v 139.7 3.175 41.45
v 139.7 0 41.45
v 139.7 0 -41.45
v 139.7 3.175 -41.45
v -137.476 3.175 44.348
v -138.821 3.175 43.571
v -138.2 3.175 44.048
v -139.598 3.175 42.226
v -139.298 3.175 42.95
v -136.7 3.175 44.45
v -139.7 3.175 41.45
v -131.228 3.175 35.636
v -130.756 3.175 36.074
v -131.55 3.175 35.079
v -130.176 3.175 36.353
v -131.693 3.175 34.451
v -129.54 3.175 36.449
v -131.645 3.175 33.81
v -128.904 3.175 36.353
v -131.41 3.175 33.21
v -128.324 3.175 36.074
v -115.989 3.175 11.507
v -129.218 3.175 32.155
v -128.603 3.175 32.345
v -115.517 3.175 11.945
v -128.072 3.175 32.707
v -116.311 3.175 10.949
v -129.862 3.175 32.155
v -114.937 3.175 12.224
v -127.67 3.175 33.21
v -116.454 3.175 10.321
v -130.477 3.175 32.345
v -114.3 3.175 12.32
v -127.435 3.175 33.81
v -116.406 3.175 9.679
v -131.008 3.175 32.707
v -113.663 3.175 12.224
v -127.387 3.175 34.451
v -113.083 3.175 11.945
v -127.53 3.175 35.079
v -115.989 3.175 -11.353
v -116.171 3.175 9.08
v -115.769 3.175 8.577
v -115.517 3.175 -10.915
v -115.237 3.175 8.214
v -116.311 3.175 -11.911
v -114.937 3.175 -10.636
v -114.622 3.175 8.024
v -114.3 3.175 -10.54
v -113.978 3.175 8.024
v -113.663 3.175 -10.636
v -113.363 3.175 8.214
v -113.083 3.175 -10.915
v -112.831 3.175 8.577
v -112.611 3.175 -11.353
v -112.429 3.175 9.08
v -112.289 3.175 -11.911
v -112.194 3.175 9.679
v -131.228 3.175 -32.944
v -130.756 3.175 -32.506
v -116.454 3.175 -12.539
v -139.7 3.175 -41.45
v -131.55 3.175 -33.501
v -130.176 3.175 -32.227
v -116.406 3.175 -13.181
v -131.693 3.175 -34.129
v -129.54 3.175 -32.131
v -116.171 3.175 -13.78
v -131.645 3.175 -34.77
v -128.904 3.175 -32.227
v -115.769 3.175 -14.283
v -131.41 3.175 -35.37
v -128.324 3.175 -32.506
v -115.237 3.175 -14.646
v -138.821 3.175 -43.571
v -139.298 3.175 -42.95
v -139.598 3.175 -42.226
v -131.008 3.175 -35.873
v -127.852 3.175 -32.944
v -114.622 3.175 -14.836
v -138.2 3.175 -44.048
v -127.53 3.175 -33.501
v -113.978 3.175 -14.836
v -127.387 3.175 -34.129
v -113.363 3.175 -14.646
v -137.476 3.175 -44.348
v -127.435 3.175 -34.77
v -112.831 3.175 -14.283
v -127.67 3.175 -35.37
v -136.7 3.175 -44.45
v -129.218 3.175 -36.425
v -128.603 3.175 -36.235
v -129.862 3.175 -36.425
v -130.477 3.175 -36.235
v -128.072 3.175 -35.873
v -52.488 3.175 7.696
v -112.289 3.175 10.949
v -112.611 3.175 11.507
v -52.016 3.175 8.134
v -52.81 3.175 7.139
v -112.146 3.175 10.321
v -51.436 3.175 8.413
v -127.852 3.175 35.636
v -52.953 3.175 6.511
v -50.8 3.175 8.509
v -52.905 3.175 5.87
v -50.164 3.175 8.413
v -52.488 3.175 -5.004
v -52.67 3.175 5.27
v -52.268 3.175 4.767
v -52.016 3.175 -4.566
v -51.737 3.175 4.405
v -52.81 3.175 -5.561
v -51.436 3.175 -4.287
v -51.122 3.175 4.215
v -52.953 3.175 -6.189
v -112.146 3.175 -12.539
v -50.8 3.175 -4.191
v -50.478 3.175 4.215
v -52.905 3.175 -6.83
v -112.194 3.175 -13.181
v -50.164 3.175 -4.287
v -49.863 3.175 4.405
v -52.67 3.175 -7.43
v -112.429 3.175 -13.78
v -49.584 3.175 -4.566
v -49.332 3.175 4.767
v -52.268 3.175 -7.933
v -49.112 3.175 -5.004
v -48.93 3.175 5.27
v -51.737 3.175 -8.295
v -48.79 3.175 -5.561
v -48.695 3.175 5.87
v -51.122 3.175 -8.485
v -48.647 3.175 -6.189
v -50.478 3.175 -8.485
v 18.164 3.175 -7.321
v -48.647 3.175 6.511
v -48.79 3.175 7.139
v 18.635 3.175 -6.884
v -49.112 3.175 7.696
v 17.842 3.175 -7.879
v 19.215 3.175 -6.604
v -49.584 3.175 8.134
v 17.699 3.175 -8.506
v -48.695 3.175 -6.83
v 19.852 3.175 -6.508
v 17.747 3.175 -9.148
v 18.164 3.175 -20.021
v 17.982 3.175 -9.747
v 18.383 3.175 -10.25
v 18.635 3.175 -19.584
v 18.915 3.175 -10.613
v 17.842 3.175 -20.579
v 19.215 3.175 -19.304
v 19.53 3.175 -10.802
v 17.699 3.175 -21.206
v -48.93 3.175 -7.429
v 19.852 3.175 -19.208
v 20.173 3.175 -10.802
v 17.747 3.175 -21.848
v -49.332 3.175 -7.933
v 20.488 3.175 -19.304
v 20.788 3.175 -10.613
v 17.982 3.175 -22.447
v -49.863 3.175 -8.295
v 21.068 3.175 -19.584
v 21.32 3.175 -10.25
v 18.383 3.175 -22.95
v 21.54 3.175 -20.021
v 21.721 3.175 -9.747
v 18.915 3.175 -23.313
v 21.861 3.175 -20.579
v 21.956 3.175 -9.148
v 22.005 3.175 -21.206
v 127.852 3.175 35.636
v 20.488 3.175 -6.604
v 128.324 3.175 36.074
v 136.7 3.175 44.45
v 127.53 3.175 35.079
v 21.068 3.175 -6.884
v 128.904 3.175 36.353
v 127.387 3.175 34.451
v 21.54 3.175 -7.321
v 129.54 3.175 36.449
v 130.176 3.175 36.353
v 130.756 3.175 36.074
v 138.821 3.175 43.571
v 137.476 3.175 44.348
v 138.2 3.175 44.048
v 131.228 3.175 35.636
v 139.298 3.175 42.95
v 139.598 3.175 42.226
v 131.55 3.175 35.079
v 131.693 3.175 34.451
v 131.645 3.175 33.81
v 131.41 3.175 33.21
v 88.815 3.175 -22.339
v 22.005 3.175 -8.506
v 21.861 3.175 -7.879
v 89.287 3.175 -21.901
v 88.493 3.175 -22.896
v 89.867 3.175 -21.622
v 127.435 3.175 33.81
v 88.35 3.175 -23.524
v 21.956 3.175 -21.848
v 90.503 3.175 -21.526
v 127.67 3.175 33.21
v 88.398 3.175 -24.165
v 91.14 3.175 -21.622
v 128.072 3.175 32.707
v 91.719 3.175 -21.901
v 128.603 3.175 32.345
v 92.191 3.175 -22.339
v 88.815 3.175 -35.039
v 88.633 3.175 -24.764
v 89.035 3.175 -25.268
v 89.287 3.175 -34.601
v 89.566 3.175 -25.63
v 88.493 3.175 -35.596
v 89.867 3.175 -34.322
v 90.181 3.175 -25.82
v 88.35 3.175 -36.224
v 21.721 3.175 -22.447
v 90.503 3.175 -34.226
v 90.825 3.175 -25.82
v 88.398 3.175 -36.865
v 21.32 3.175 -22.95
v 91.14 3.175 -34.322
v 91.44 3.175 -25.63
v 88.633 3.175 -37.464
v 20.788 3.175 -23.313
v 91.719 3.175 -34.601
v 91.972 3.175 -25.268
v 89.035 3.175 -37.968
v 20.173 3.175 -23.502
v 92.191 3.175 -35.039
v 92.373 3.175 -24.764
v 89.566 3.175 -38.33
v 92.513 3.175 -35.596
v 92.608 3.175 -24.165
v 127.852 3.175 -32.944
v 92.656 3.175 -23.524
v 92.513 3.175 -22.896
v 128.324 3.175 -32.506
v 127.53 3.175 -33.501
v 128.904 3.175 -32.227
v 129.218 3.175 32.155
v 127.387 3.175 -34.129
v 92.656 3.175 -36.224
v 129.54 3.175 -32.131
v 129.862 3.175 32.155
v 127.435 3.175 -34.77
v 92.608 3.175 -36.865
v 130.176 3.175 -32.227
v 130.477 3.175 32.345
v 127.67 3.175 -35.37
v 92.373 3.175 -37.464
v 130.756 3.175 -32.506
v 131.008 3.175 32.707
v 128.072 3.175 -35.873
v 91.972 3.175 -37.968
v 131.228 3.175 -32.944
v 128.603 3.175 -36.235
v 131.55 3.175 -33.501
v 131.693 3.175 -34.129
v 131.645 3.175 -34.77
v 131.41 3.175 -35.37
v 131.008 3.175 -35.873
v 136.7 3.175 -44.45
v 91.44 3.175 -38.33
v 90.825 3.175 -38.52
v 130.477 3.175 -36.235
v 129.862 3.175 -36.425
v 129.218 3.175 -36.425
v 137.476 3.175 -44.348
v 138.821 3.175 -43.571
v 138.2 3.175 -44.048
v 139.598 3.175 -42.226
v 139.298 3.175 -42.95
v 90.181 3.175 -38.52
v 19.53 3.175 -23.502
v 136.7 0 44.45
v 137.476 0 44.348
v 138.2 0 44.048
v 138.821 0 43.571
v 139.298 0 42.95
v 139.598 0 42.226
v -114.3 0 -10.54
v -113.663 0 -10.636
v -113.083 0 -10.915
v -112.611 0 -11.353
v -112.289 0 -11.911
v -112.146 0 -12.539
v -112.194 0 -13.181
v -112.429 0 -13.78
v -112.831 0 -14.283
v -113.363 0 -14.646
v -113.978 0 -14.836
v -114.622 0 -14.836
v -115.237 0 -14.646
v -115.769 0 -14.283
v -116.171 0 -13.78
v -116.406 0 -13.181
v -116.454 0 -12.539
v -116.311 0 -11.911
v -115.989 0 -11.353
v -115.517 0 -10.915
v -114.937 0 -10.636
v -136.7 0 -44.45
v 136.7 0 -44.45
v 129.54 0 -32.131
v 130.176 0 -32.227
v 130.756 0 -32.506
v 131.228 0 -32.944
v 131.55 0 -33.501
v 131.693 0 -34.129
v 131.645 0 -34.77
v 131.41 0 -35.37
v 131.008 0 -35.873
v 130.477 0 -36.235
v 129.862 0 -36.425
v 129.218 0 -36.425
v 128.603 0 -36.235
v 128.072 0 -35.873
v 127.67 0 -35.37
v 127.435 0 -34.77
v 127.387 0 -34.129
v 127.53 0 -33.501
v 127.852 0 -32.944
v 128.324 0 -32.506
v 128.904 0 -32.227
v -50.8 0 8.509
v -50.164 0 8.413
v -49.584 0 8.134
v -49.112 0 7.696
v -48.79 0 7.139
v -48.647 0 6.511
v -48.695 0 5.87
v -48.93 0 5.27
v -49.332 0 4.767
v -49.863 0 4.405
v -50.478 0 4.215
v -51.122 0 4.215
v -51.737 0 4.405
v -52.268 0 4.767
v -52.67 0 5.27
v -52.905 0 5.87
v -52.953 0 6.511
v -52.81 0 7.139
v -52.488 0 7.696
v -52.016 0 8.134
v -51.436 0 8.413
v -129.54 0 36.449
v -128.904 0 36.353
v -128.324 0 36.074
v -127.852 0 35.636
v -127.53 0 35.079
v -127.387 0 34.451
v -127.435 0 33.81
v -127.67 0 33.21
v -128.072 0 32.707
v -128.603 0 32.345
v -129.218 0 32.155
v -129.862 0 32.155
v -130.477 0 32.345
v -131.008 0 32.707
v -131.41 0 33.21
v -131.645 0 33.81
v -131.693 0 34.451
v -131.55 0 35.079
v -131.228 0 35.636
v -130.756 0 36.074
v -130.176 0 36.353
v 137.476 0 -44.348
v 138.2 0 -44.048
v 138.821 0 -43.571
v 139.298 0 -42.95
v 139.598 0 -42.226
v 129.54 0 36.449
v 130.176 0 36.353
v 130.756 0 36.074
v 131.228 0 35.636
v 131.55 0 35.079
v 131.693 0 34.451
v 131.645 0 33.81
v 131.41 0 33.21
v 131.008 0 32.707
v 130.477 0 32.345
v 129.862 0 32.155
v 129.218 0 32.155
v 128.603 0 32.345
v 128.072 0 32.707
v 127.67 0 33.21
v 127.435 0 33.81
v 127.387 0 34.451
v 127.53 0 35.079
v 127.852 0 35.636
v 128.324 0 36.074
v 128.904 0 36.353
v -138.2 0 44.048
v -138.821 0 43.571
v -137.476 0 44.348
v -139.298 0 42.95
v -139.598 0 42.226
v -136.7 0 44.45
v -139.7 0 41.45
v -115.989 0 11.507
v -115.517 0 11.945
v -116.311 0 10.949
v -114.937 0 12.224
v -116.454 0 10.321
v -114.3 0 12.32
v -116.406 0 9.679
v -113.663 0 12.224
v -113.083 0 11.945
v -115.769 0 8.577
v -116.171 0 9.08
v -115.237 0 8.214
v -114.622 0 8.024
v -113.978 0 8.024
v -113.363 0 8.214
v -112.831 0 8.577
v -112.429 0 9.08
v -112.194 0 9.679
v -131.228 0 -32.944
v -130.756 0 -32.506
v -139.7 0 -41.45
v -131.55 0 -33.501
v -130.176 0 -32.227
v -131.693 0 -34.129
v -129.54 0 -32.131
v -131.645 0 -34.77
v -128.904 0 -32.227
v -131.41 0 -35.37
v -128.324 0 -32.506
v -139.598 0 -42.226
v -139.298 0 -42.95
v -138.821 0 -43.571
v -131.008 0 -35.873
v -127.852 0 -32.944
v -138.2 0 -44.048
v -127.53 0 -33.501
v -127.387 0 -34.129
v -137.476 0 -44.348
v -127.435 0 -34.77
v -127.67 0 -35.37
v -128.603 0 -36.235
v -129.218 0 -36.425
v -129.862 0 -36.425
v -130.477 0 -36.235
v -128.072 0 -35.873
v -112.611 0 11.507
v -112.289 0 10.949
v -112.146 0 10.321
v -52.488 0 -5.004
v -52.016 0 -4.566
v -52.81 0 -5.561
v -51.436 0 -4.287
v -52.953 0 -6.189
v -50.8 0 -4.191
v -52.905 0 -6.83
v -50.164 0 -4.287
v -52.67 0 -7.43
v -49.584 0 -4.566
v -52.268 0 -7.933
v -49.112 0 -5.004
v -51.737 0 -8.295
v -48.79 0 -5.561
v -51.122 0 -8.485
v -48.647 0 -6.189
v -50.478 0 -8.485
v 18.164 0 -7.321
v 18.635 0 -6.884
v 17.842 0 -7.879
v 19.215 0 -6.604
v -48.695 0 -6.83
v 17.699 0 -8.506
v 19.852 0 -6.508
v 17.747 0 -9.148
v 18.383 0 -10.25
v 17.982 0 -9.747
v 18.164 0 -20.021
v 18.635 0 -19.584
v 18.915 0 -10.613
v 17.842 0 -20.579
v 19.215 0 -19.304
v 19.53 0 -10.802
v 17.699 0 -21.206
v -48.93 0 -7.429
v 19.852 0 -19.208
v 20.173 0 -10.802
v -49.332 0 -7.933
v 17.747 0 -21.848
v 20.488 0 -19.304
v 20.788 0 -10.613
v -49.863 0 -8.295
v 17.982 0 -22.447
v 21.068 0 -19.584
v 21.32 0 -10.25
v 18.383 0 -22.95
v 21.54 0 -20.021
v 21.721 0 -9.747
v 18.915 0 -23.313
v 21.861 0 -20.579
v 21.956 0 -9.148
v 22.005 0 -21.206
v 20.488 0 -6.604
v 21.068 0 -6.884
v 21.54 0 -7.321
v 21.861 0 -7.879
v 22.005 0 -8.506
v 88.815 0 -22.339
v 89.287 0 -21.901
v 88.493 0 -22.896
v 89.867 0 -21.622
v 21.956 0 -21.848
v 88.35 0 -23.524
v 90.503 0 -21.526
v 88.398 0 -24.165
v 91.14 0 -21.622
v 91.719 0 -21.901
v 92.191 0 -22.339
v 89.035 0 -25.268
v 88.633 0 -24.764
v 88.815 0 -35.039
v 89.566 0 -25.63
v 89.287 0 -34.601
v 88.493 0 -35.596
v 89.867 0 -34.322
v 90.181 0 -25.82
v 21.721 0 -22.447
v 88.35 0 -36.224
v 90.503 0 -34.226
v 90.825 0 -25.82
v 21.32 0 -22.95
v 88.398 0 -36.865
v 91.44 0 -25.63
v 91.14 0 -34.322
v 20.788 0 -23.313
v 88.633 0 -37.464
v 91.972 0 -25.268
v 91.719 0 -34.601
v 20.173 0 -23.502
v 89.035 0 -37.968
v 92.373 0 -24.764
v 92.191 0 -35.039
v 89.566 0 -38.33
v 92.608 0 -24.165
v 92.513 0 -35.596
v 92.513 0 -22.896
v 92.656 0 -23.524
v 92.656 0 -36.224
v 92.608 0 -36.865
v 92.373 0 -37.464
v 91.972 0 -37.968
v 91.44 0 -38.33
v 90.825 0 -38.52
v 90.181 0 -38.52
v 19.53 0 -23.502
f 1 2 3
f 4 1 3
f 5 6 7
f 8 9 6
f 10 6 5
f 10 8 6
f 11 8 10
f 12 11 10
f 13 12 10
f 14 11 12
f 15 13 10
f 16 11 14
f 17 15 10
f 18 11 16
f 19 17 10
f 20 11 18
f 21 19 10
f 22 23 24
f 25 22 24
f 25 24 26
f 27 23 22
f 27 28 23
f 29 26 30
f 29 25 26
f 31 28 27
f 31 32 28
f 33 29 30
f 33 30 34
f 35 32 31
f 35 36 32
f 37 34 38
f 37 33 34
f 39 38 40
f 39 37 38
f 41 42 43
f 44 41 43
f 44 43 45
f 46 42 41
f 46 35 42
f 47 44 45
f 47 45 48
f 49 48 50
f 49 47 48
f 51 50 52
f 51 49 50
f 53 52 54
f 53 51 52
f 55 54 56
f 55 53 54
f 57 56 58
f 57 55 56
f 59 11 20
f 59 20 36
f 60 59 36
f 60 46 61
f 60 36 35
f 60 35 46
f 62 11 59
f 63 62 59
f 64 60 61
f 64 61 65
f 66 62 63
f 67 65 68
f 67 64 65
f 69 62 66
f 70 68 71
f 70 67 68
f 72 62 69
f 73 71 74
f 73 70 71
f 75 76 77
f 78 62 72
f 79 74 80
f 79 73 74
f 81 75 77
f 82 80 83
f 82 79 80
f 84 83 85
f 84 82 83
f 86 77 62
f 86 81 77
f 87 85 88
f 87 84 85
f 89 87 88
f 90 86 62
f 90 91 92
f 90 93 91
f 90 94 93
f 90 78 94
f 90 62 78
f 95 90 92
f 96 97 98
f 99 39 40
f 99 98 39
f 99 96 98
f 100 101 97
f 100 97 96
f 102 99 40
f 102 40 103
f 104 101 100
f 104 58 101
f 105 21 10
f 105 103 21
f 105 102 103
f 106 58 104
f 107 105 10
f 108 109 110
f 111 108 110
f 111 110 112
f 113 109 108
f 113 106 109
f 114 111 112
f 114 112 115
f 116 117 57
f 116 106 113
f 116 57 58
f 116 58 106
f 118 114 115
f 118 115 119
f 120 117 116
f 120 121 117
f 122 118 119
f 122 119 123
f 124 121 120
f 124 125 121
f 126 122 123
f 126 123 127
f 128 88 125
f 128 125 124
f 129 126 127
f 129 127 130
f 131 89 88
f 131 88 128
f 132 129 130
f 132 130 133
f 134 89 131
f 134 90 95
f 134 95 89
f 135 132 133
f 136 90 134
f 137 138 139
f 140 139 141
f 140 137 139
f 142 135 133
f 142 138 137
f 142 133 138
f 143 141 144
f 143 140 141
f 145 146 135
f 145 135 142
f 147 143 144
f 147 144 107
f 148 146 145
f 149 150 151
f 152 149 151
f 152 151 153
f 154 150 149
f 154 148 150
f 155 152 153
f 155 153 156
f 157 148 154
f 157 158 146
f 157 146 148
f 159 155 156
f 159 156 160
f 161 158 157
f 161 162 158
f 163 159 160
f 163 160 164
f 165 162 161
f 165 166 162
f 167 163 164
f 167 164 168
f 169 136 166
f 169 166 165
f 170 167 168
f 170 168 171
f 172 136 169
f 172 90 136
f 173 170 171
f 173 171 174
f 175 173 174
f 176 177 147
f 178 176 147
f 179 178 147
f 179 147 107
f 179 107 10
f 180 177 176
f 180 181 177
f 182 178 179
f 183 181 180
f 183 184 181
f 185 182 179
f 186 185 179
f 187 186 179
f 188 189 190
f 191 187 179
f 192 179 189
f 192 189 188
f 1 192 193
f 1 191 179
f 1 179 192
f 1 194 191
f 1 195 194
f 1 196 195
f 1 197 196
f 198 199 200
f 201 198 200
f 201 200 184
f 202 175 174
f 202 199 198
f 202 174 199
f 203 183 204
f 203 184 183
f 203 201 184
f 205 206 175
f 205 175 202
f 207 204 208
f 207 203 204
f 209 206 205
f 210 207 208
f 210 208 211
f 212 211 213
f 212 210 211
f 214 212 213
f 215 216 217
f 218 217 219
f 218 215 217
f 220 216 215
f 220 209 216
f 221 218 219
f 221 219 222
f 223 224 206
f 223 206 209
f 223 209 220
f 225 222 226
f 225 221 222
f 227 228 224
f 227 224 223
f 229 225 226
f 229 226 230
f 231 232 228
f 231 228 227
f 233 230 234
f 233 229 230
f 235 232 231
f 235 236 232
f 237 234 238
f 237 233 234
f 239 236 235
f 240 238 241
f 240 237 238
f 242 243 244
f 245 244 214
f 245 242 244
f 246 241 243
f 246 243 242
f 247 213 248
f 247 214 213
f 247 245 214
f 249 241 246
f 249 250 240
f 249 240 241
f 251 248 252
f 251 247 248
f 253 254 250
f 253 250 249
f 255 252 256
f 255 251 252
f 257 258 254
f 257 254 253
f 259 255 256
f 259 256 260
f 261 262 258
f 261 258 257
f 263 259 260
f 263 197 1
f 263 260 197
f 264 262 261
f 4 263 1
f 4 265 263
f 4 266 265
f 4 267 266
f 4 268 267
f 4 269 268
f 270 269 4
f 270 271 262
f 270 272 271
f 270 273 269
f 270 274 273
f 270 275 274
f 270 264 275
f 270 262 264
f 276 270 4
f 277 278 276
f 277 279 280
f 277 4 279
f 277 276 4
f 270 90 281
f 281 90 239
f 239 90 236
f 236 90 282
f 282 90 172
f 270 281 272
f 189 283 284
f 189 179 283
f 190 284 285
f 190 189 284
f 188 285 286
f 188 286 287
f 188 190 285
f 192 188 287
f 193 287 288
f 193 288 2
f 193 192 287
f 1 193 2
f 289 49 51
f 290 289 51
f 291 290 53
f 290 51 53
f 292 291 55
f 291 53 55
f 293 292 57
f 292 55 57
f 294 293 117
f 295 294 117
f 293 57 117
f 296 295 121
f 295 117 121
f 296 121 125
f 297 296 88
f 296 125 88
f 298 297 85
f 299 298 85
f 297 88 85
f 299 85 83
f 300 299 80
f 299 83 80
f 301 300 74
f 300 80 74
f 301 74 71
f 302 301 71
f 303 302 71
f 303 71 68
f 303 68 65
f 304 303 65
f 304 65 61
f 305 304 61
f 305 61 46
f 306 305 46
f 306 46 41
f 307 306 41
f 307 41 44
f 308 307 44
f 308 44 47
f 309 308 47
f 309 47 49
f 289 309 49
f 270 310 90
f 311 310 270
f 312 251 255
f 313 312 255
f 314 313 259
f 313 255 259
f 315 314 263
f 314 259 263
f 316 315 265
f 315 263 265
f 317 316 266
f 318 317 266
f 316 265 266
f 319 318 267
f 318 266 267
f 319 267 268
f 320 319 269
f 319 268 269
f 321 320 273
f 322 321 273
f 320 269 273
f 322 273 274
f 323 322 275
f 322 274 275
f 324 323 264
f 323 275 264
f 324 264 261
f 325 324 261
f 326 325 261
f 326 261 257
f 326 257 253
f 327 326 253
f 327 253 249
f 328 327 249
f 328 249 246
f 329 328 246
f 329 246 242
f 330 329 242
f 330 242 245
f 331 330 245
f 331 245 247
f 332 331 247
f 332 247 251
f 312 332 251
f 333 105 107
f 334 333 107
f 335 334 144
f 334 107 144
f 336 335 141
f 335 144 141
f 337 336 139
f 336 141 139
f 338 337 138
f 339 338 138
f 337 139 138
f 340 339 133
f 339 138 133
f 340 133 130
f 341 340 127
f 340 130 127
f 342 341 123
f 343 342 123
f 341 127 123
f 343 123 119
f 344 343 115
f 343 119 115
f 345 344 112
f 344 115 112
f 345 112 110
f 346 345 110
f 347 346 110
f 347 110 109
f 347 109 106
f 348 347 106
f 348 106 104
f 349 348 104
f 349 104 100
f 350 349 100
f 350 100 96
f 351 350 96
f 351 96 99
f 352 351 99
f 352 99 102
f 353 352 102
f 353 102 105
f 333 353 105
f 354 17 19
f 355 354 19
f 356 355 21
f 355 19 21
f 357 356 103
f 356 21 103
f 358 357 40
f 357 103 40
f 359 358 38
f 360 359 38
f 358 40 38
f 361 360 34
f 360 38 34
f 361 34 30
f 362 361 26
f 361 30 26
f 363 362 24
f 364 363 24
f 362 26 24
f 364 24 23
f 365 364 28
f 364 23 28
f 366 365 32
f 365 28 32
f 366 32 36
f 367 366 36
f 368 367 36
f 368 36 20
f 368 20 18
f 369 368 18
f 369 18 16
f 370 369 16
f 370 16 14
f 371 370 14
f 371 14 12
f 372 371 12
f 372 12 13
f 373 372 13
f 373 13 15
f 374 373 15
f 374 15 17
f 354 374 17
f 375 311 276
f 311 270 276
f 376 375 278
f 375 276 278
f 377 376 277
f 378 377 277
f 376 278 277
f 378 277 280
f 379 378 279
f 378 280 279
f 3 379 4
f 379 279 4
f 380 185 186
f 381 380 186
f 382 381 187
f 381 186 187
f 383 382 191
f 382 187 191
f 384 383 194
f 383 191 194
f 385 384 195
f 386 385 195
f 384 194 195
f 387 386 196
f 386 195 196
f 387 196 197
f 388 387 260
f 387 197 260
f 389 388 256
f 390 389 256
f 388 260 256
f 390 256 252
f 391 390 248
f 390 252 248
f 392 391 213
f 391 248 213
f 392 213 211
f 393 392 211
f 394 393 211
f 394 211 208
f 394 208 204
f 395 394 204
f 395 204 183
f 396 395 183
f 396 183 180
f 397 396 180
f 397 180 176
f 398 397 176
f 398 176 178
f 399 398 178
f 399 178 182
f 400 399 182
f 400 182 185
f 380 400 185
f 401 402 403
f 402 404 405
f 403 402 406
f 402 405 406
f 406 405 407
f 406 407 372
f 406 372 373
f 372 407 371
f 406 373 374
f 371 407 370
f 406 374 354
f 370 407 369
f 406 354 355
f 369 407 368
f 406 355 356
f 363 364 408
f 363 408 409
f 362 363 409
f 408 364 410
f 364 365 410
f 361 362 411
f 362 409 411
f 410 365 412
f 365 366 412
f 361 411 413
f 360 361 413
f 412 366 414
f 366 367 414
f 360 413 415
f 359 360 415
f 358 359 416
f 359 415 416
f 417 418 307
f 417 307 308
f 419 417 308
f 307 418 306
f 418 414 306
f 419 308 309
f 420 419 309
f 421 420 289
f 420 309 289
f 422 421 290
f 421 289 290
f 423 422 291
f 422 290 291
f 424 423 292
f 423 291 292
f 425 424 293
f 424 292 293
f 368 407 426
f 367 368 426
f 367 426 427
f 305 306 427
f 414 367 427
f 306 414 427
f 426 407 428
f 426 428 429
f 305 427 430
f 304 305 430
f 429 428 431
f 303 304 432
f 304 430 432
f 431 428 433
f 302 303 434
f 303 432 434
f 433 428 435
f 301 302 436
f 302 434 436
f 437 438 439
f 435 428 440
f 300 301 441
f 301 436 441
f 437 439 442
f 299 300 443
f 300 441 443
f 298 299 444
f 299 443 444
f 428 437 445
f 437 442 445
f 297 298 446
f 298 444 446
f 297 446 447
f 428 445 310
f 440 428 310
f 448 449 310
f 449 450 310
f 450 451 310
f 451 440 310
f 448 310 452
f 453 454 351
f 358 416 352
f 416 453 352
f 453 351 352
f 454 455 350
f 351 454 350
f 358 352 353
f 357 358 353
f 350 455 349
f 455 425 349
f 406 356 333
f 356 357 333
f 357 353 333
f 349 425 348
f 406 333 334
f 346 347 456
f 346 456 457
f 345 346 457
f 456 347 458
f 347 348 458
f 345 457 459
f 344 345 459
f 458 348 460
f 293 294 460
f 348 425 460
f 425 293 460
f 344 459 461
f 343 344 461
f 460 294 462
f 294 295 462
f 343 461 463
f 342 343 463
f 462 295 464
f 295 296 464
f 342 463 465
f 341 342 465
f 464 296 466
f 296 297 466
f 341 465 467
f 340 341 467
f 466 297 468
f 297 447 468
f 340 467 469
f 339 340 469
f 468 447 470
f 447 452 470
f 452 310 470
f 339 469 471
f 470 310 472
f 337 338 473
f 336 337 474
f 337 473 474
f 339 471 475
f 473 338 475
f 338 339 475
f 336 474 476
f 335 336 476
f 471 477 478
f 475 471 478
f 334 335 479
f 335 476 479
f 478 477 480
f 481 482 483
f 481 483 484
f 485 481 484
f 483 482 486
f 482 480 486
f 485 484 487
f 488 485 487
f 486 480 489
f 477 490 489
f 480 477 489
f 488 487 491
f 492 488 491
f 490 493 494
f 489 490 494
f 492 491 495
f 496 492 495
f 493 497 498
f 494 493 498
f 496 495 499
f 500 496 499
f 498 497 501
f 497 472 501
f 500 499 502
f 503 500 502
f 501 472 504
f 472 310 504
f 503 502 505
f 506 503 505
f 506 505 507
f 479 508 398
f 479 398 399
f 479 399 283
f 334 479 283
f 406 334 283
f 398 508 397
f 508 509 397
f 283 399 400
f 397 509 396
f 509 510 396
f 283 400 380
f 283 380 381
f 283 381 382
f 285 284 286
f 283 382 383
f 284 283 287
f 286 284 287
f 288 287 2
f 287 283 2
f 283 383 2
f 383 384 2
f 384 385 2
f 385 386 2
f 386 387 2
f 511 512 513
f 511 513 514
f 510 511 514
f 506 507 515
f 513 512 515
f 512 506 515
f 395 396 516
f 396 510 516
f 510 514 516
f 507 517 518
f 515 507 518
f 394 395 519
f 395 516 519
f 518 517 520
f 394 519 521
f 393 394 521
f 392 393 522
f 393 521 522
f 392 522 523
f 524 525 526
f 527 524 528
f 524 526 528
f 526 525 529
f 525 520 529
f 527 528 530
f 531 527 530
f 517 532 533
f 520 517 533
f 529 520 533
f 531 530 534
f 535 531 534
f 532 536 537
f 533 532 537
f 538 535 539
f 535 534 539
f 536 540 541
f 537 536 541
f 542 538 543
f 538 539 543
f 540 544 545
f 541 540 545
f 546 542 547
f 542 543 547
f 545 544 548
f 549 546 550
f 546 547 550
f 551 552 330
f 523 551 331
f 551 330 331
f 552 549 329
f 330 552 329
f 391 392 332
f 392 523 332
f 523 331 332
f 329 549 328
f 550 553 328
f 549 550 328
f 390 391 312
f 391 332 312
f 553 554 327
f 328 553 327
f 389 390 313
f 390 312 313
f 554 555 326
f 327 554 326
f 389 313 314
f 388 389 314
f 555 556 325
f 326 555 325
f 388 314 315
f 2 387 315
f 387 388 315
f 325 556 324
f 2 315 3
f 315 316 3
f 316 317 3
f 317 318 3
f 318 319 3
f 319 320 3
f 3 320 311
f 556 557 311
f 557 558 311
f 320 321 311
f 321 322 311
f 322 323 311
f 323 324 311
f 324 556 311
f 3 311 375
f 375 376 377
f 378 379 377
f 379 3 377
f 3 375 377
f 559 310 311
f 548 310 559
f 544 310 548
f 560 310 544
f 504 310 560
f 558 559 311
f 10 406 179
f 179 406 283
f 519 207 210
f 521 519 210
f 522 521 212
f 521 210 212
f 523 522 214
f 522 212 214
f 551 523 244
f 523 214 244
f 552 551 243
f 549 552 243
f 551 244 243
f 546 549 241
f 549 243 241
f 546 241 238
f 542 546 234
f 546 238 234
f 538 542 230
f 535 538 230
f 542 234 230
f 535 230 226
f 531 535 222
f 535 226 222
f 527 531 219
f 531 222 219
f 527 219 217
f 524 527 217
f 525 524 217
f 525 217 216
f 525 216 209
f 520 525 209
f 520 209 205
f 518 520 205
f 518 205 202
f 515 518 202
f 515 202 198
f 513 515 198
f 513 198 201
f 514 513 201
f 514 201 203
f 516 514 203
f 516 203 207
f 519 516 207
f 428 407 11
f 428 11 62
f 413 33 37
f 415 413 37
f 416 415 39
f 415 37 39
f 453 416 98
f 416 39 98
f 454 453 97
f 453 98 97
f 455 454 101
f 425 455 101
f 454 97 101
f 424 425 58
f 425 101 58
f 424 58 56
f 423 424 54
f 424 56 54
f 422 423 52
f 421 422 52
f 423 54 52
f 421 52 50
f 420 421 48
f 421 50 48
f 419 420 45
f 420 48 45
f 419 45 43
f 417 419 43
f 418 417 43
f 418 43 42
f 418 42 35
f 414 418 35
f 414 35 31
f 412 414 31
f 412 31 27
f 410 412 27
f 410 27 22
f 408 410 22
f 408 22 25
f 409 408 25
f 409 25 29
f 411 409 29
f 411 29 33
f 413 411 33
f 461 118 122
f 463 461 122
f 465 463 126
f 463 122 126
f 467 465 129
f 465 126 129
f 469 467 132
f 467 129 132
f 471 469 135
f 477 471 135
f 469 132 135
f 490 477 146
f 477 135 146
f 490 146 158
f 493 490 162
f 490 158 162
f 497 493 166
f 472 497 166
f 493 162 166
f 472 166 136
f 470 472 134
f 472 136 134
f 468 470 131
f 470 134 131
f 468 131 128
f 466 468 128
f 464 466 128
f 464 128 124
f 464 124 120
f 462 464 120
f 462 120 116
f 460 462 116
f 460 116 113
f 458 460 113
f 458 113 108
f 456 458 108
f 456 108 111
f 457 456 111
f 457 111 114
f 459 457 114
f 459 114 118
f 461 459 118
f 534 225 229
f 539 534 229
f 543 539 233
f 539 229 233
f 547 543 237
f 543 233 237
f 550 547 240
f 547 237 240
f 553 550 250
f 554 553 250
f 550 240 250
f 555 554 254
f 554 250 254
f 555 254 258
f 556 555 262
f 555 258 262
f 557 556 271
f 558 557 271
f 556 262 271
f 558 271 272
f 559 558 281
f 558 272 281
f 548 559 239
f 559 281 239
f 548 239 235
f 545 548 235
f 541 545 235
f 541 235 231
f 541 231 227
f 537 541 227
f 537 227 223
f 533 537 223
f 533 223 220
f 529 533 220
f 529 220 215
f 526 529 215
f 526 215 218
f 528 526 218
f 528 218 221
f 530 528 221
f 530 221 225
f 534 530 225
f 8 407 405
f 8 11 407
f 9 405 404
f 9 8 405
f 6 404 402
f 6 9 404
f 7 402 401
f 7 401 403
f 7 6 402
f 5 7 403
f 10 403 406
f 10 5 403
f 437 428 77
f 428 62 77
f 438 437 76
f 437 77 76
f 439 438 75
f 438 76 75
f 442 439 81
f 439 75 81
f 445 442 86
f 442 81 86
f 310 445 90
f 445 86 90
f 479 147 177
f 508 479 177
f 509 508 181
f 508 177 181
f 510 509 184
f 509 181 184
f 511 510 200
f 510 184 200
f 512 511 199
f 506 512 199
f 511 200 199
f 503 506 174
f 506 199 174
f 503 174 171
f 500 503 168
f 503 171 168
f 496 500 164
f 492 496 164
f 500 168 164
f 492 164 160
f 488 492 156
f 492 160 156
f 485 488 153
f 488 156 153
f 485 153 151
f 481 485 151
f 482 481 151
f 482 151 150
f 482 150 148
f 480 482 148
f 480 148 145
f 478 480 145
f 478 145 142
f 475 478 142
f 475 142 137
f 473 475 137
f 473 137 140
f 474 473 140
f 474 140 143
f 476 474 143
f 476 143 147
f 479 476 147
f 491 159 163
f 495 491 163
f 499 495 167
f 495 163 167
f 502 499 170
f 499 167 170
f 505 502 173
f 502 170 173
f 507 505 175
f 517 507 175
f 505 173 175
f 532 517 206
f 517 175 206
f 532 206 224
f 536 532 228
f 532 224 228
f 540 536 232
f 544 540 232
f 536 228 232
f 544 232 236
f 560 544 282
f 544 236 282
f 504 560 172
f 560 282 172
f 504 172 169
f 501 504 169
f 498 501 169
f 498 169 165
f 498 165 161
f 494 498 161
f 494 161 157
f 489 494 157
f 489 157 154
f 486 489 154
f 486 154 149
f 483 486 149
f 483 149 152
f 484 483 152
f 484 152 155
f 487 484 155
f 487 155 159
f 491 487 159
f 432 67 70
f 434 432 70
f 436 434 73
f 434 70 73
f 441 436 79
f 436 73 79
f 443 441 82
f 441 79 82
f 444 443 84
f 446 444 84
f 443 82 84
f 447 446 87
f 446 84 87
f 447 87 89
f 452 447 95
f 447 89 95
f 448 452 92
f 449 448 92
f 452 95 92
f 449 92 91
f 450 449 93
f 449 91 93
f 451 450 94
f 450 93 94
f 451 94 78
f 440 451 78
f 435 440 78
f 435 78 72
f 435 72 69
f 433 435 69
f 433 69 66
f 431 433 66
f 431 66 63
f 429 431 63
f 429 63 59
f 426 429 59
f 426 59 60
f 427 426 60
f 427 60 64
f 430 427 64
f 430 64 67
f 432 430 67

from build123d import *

# Parameters (mm, degrees)
SKETCH1_W           = 279.4
SKETCH1_H           = 88.9
BOSS_EXTRUDE1_DEPTH = 3.175
SKETCH2_R           = 2.16
SKETCH2_R_2         = 2.159
CUT_EXTRUDE1_DEPTH  = 6.35
FILLET1_R           = 3


with BuildPart() as part:
    # Sketch1 → Boss-Extrude1 (new body)
    with BuildSketch(Plane(origin=(0, 0, 0), x_dir=(1, 0, 0), z_dir=(0, 1, 0))):
        Rectangle(SKETCH1_W, SKETCH1_H)
    extrude(amount=BOSS_EXTRUDE1_DEPTH)

    # Sketch2 → Cut-Extrude1 (cut)
    with BuildSketch(Plane(origin=(0, 3.175, 0), x_dir=(1, 0, 0), z_dir=(0, 1, 0))):
        with Locations(Location((-114.3, 12.7, 0), (0, 0, 270))):
            Circle(SKETCH2_R)
        with Locations(Location((-114.3, -10.16, 0), (0, 0, 270))):
            Circle(SKETCH2_R)
        with Locations(Location((-50.8, 6.35, 0), (0, 0, 270))):
            Circle(SKETCH2_R_2)
        with Locations(Location((-50.8, -6.35, 0), (0, 0, 270))):
            Circle(SKETCH2_R_2)
        with Locations(Location((19.851601201, 8.667461428, 0), (0, 0, 270))):
            Circle(SKETCH2_R_2)
        with Locations(Location((19.851601201, 21.367461428, 0), (0, 0, 270))):
            Circle(SKETCH2_R_2)
        with Locations(Location((90.503202402, 23.684922856, 0), (0, 0, 270))):
            Circle(SKETCH2_R_2)
        with Locations(Location((90.503202402, 36.384922856, 0), (0, 0, 270))):
            Circle(SKETCH2_R_2)
        with Locations(Location((129.54, -34.29, 0), (0, 0, 270))):
            Circle(SKETCH2_R_2)
        with Locations(Location((-129.54, -34.29, 0), (0, 0, 270))):
            Circle(SKETCH2_R_2)
        with Locations(Location((-129.54, 34.29, 0), (0, 0, 270))):
            Circle(SKETCH2_R_2)
        with Locations(Location((129.54, 34.29, 0), (0, 0, 270))):
            Circle(SKETCH2_R_2)
    extrude(amount=-CUT_EXTRUDE1_DEPTH, mode=Mode.SUBTRACT)

    # Fillet1
    fillet1_edges = [part.edges().sort_by_distance(p)[0] for p in [
        (139.7, 1.5875, 44.45),
        (-139.7, 1.5875, 44.45),
        (-139.7, 1.5875, -44.45),
        (139.7, 1.5875, -44.45),
    ]]
    fillet(fillet1_edges, radius=FILLET1_R)


solid = part.part
